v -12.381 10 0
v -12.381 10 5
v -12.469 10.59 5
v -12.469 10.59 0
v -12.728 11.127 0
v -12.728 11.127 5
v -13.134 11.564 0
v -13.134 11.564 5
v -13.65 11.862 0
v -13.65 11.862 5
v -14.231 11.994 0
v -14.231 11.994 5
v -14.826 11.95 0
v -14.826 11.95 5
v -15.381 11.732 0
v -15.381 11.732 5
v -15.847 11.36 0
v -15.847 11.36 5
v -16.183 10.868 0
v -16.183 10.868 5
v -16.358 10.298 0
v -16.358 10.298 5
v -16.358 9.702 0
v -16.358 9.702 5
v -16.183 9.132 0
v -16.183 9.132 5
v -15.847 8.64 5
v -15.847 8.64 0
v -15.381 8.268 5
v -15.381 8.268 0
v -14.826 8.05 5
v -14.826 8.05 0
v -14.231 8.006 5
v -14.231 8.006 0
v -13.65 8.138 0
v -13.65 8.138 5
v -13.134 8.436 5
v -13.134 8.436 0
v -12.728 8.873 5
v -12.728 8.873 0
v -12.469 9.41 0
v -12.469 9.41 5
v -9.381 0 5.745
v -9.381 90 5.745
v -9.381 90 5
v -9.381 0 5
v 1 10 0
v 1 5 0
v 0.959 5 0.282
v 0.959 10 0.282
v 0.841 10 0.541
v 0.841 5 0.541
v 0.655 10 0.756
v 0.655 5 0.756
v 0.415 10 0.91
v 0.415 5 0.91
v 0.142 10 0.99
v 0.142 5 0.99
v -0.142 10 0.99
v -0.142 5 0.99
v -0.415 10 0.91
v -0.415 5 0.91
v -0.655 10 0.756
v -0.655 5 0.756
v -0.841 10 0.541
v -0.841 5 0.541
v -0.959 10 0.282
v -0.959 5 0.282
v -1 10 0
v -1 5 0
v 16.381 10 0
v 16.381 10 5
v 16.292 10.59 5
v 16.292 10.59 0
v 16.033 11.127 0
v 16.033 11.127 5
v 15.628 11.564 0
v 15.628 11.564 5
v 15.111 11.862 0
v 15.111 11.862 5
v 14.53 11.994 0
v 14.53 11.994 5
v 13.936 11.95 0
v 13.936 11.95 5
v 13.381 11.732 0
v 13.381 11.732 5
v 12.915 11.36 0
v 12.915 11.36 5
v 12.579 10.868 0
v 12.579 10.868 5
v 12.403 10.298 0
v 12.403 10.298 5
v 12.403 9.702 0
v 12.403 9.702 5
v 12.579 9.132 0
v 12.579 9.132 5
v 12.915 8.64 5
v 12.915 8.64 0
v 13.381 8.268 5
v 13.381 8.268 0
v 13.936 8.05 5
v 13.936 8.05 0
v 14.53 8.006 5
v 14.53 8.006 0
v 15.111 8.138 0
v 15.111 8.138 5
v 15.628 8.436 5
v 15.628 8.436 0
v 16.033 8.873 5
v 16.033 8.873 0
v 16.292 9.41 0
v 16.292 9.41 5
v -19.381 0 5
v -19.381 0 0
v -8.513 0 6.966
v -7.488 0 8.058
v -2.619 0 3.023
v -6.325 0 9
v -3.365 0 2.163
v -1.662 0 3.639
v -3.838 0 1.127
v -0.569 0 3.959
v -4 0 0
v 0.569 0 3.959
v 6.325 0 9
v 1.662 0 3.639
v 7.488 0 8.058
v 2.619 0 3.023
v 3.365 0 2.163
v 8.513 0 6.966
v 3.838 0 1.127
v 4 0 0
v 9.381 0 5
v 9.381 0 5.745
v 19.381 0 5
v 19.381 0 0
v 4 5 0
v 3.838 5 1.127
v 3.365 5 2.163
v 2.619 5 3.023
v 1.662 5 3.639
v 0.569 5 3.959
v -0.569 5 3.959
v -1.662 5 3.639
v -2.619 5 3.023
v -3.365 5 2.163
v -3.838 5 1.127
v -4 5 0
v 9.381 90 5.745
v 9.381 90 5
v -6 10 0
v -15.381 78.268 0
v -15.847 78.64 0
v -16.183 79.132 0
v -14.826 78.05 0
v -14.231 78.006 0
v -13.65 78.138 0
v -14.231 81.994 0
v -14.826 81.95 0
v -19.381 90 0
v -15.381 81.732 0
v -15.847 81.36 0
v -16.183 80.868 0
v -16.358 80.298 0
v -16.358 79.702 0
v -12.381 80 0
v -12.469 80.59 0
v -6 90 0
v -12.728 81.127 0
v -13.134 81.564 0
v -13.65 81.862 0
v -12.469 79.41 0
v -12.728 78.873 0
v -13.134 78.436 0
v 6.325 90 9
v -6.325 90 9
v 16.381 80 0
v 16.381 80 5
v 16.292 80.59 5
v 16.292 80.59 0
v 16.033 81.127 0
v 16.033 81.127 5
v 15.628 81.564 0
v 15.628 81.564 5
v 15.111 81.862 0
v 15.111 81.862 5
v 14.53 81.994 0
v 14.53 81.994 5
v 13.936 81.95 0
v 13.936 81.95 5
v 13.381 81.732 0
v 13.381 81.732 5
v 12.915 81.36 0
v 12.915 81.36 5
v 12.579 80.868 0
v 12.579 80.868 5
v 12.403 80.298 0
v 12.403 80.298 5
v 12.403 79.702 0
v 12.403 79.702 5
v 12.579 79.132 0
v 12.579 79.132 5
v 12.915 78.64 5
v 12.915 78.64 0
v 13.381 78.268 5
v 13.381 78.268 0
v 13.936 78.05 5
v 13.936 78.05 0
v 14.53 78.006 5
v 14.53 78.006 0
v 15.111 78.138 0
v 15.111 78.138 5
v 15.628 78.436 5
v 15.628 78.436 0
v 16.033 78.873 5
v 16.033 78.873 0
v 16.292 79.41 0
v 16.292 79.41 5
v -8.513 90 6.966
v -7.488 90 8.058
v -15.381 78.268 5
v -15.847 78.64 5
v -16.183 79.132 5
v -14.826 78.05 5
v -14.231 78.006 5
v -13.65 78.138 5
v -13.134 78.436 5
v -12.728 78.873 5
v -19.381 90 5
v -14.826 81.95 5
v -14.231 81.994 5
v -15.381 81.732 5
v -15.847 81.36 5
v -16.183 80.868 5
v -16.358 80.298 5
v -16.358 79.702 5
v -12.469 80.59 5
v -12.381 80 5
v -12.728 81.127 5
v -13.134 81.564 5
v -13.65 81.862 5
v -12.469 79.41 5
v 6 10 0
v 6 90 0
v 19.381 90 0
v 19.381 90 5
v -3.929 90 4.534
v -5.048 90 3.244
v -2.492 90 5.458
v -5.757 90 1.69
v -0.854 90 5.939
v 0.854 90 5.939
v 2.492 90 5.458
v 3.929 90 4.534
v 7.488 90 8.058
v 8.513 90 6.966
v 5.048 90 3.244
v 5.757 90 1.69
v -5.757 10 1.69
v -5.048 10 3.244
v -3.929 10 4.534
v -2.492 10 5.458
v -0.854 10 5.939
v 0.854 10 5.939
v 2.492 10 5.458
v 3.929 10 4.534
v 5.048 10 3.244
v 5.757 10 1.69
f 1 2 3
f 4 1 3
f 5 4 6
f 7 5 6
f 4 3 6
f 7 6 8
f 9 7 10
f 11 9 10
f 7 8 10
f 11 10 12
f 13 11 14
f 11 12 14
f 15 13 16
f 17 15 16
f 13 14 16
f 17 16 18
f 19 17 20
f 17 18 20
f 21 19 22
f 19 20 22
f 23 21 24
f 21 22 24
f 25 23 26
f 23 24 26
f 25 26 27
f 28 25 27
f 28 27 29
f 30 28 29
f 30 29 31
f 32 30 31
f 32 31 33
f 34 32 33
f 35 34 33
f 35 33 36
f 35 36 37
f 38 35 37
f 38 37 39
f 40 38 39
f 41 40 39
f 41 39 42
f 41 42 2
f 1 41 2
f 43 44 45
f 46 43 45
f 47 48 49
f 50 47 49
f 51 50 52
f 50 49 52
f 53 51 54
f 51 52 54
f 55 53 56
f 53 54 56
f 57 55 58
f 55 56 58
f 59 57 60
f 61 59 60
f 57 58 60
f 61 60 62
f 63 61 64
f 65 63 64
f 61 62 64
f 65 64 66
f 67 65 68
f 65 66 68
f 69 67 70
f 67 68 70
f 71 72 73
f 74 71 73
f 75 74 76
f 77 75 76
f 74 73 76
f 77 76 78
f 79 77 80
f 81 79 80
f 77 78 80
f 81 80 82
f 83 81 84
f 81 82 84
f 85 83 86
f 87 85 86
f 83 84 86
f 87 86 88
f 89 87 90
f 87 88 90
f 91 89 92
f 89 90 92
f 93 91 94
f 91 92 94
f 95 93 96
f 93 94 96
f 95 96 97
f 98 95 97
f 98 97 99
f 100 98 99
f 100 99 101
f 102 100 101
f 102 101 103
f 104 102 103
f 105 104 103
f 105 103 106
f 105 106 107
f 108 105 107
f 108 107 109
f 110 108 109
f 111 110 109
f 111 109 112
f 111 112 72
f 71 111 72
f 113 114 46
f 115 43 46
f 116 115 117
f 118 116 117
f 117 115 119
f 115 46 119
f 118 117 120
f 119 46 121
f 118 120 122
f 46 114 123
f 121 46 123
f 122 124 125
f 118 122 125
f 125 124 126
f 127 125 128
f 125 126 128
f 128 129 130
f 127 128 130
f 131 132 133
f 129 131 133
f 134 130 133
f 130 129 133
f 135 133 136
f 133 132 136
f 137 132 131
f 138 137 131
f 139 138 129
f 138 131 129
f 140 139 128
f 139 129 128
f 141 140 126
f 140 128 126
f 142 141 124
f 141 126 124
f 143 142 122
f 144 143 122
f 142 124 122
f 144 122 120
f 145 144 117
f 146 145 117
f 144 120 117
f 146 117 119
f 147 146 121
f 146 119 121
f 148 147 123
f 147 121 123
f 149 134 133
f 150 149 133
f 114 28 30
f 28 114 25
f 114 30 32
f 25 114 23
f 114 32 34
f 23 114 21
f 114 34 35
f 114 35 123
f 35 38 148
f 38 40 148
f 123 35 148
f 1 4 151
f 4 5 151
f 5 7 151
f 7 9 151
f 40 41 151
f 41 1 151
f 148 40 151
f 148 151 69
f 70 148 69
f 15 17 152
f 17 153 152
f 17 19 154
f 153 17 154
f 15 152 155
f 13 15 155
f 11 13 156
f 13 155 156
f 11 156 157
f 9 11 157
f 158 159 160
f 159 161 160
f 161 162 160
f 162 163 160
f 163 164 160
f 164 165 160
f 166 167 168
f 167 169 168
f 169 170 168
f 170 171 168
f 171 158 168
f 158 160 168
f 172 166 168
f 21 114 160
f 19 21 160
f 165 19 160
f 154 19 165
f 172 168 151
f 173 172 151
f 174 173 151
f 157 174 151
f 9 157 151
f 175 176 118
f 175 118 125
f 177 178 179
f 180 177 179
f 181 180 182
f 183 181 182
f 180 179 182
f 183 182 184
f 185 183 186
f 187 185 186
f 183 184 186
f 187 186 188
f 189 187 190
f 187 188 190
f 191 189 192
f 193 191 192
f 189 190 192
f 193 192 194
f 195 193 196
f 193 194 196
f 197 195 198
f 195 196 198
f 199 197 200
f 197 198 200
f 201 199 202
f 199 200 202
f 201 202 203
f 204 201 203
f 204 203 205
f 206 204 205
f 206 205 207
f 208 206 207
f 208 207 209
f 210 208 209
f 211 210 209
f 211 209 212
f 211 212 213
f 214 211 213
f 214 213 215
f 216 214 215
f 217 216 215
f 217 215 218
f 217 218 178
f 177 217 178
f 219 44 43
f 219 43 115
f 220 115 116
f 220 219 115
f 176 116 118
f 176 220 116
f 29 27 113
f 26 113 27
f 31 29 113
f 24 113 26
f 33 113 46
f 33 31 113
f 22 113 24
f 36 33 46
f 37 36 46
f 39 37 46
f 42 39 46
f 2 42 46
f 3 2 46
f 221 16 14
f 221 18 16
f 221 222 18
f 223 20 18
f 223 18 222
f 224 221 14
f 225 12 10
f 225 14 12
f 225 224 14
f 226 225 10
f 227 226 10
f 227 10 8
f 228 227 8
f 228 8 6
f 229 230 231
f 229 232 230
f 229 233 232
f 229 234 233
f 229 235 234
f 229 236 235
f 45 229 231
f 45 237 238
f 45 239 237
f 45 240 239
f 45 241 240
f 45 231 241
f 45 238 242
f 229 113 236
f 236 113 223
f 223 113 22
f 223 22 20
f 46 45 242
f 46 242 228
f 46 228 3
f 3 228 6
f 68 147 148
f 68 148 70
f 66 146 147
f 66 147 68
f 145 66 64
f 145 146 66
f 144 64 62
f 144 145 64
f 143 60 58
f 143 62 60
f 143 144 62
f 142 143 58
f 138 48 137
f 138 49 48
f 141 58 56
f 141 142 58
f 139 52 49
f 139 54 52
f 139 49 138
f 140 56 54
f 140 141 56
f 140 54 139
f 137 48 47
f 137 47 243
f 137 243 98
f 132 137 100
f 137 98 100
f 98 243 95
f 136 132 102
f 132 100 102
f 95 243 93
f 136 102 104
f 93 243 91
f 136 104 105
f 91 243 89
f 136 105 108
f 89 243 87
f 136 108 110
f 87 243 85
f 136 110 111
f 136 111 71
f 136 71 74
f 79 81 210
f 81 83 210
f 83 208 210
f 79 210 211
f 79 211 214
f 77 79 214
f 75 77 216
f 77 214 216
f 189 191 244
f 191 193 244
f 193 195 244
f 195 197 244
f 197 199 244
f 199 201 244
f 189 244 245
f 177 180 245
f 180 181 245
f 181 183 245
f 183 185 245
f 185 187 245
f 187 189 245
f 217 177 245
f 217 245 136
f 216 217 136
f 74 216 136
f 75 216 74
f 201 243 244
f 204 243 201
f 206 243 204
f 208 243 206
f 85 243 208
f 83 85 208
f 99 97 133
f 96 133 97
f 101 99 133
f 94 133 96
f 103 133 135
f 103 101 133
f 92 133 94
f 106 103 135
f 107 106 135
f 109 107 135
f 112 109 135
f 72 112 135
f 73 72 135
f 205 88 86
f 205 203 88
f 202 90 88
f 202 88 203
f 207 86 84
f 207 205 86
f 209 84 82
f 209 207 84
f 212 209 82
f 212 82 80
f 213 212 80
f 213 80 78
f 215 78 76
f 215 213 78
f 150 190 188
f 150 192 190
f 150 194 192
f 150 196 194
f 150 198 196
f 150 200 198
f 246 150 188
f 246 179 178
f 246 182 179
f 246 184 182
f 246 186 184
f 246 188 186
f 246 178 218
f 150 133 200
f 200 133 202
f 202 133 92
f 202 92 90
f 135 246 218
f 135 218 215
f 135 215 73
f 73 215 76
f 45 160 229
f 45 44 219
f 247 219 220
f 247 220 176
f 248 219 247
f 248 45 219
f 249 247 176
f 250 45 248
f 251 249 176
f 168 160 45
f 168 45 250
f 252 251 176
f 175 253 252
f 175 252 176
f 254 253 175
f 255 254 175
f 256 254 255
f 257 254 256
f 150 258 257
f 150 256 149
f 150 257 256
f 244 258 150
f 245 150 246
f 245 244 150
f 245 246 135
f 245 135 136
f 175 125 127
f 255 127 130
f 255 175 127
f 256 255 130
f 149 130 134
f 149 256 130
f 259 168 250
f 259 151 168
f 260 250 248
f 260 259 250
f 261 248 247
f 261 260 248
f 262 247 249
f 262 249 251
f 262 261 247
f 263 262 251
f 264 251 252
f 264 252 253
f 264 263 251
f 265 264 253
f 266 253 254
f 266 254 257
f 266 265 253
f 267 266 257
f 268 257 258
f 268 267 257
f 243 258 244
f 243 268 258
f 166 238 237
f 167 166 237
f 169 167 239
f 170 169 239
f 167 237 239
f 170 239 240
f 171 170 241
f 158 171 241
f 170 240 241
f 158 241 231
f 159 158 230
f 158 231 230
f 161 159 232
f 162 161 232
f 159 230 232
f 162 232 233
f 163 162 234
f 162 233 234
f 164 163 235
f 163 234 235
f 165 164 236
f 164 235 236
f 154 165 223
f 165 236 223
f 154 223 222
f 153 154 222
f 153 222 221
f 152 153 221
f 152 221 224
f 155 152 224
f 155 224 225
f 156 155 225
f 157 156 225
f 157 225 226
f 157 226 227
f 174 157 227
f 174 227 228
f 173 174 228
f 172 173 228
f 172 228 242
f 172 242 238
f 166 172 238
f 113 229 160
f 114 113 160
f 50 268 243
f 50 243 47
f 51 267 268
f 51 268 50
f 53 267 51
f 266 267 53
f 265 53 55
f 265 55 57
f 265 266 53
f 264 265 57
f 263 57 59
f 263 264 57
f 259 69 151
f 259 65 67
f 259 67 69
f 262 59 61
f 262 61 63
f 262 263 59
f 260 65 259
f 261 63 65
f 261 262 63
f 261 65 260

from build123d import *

# Parameters (mm, degrees)
ROTATION1_ANGLE                      = 180
SCHNITT_LINEAR_AUSTRAGEN2_DEPTH      = 92.33454987
SCHNITT_LINEAR_AUSTRAGEN2_DEPTH_BACK = 90
SCHNITT_LINEAR_AUSTRAGEN3_DEPTH      = 92.33454987
SCHNITT_LINEAR_AUSTRAGEN3_DEPTH_BACK = 90
SKIZZE8_W                            = 10
SKIZZE8_H                            = 5
AUFSATZ_LINEAR_AUSTRAGEN2_DEPTH      = 90
SKIZZE9_W                            = 10
SKIZZE9_H                            = 5
AUFSATZ_LINEAR_AUSTRAGEN3_DEPTH      = 90
SKIZZE14_R                           = 2
SCHNITT_LINEAR_AUSTRAGEN7_DEPTH      = 93.258379674
SKIZZE16_R                           = 1
SCHNITT_LINEAR_AUSTRAGEN8_DEPTH      = 93.717898057
SKIZZE18_R                           = 4
SCHNITT_LINEAR_AUSTRAGEN9_DEPTH      = 5
SKIZZE20_W                           = 21.700648505
SKIZZE20_H                           = 2
SCHNITT_LINEAR_AUSTRAGEN10_DEPTH     = 93.717898057


with BuildPart() as part:
    # Skizze3 → Rotation1 (revolve)
    with BuildSketch(Plane.XY):
        Polygon((0, 0), (-11, 0), (-11, 90), (-6, 90), (-6, 10), (0, 10), align=None)
    revolve(axis=Axis((0, 0, 0), (0, 1, 0)), revolution_arc=ROTATION1_ANGLE)

    # Skizze6 → Schnitt-Linear austragen2 (cut, two sides: drawn at the far end of the back side and taken through both)
    with BuildSketch(Plane(origin=(0, 90, 0), x_dir=(1, 0, 0), z_dir=(0, 1, 0)).offset(-SCHNITT_LINEAR_AUSTRAGEN2_DEPTH_BACK)):
        Polygon((-9.380624863, -62.0642209), (-9.380624863, -5.744900102), (-9.380624863, 0), (-9.380624863, 56.319320799), (-122.01926646, 56.319320799), (-122.01926646, -62.0642209), align=None)
    extrude(amount=SCHNITT_LINEAR_AUSTRAGEN2_DEPTH + SCHNITT_LINEAR_AUSTRAGEN2_DEPTH_BACK, mode=Mode.SUBTRACT)

    # Skizze7 → Schnitt-Linear austragen3 (cut, two sides: drawn at the far end of the back side and taken through both)
    with BuildSketch(Plane.XZ.offset(-SCHNITT_LINEAR_AUSTRAGEN3_DEPTH_BACK)):
        Polygon((9.380624863, 59.241313346), (9.380624863, 5.744900102), (9.380624863, 0), (9.380624863, -53.496413245), (116.373451353, -53.496413245), (116.373451353, 59.241313346), align=None)
    extrude(amount=SCHNITT_LINEAR_AUSTRAGEN3_DEPTH + SCHNITT_LINEAR_AUSTRAGEN3_DEPTH_BACK, mode=Mode.SUBTRACT)

    # Skizze8 → Aufsatz-Linear austragen2 (add)
    with BuildSketch(Plane(origin=(0, 90, 0), x_dir=(1, 0, 0), z_dir=(0, 1, 0))):
        with Locations((-14.380624863, -2.5)):
            Rectangle(SKIZZE8_W, SKIZZE8_H)
    extrude(amount=-AUFSATZ_LINEAR_AUSTRAGEN2_DEPTH)

    # Skizze9 → Aufsatz-Linear austragen3 (add)
    with BuildSketch(Plane(origin=(0, 90, 0), x_dir=(1, 0, 0), z_dir=(0, 1, 0))):
        with Locations((14.380624863, -2.5)):
            Rectangle(SKIZZE9_W, SKIZZE9_H)
    extrude(amount=-AUFSATZ_LINEAR_AUSTRAGEN3_DEPTH)

    # Skizze14 → Schnitt-Linear austragen7 (cut, through all)
    with BuildSketch(Plane.XY.offset(5)):
        with Locations((-14.380624863, 80)):
            Circle(SKIZZE14_R)
        with Locations((-14.380624863, 10)):
            Circle(SKIZZE14_R)
        with Locations((14.380624863, 10)):
            Circle(SKIZZE14_R)
        with Locations((14.380624863, 80)):
            Circle(SKIZZE14_R)
    extrude(amount=-SCHNITT_LINEAR_AUSTRAGEN7_DEPTH, mode=Mode.SUBTRACT)

    # Skizze16 → Schnitt-Linear austragen8 (cut, through all)
    with BuildSketch(Plane.XZ):
        Circle(SKIZZE16_R)
    extrude(amount=-SCHNITT_LINEAR_AUSTRAGEN8_DEPTH, mode=Mode.SUBTRACT)

    # Skizze18 → Schnitt-Linear austragen9 (cut)
    with BuildSketch(Plane.XZ):
        Circle(SKIZZE18_R)
    extrude(amount=-SCHNITT_LINEAR_AUSTRAGEN9_DEPTH, mode=Mode.SUBTRACT)

    # Skizze20 → Schnitt-Linear austragen10 (cut, through all)
    with BuildSketch(Plane(origin=(0, 90, 0), x_dir=(1, 0, 0), z_dir=(0, 1, 0))):
        with Locations((-0.450220923, -10)):
            Rectangle(SKIZZE20_W, SKIZZE20_H)
    extrude(amount=-SCHNITT_LINEAR_AUSTRAGEN10_DEPTH, mode=Mode.SUBTRACT)


solid = part.part
